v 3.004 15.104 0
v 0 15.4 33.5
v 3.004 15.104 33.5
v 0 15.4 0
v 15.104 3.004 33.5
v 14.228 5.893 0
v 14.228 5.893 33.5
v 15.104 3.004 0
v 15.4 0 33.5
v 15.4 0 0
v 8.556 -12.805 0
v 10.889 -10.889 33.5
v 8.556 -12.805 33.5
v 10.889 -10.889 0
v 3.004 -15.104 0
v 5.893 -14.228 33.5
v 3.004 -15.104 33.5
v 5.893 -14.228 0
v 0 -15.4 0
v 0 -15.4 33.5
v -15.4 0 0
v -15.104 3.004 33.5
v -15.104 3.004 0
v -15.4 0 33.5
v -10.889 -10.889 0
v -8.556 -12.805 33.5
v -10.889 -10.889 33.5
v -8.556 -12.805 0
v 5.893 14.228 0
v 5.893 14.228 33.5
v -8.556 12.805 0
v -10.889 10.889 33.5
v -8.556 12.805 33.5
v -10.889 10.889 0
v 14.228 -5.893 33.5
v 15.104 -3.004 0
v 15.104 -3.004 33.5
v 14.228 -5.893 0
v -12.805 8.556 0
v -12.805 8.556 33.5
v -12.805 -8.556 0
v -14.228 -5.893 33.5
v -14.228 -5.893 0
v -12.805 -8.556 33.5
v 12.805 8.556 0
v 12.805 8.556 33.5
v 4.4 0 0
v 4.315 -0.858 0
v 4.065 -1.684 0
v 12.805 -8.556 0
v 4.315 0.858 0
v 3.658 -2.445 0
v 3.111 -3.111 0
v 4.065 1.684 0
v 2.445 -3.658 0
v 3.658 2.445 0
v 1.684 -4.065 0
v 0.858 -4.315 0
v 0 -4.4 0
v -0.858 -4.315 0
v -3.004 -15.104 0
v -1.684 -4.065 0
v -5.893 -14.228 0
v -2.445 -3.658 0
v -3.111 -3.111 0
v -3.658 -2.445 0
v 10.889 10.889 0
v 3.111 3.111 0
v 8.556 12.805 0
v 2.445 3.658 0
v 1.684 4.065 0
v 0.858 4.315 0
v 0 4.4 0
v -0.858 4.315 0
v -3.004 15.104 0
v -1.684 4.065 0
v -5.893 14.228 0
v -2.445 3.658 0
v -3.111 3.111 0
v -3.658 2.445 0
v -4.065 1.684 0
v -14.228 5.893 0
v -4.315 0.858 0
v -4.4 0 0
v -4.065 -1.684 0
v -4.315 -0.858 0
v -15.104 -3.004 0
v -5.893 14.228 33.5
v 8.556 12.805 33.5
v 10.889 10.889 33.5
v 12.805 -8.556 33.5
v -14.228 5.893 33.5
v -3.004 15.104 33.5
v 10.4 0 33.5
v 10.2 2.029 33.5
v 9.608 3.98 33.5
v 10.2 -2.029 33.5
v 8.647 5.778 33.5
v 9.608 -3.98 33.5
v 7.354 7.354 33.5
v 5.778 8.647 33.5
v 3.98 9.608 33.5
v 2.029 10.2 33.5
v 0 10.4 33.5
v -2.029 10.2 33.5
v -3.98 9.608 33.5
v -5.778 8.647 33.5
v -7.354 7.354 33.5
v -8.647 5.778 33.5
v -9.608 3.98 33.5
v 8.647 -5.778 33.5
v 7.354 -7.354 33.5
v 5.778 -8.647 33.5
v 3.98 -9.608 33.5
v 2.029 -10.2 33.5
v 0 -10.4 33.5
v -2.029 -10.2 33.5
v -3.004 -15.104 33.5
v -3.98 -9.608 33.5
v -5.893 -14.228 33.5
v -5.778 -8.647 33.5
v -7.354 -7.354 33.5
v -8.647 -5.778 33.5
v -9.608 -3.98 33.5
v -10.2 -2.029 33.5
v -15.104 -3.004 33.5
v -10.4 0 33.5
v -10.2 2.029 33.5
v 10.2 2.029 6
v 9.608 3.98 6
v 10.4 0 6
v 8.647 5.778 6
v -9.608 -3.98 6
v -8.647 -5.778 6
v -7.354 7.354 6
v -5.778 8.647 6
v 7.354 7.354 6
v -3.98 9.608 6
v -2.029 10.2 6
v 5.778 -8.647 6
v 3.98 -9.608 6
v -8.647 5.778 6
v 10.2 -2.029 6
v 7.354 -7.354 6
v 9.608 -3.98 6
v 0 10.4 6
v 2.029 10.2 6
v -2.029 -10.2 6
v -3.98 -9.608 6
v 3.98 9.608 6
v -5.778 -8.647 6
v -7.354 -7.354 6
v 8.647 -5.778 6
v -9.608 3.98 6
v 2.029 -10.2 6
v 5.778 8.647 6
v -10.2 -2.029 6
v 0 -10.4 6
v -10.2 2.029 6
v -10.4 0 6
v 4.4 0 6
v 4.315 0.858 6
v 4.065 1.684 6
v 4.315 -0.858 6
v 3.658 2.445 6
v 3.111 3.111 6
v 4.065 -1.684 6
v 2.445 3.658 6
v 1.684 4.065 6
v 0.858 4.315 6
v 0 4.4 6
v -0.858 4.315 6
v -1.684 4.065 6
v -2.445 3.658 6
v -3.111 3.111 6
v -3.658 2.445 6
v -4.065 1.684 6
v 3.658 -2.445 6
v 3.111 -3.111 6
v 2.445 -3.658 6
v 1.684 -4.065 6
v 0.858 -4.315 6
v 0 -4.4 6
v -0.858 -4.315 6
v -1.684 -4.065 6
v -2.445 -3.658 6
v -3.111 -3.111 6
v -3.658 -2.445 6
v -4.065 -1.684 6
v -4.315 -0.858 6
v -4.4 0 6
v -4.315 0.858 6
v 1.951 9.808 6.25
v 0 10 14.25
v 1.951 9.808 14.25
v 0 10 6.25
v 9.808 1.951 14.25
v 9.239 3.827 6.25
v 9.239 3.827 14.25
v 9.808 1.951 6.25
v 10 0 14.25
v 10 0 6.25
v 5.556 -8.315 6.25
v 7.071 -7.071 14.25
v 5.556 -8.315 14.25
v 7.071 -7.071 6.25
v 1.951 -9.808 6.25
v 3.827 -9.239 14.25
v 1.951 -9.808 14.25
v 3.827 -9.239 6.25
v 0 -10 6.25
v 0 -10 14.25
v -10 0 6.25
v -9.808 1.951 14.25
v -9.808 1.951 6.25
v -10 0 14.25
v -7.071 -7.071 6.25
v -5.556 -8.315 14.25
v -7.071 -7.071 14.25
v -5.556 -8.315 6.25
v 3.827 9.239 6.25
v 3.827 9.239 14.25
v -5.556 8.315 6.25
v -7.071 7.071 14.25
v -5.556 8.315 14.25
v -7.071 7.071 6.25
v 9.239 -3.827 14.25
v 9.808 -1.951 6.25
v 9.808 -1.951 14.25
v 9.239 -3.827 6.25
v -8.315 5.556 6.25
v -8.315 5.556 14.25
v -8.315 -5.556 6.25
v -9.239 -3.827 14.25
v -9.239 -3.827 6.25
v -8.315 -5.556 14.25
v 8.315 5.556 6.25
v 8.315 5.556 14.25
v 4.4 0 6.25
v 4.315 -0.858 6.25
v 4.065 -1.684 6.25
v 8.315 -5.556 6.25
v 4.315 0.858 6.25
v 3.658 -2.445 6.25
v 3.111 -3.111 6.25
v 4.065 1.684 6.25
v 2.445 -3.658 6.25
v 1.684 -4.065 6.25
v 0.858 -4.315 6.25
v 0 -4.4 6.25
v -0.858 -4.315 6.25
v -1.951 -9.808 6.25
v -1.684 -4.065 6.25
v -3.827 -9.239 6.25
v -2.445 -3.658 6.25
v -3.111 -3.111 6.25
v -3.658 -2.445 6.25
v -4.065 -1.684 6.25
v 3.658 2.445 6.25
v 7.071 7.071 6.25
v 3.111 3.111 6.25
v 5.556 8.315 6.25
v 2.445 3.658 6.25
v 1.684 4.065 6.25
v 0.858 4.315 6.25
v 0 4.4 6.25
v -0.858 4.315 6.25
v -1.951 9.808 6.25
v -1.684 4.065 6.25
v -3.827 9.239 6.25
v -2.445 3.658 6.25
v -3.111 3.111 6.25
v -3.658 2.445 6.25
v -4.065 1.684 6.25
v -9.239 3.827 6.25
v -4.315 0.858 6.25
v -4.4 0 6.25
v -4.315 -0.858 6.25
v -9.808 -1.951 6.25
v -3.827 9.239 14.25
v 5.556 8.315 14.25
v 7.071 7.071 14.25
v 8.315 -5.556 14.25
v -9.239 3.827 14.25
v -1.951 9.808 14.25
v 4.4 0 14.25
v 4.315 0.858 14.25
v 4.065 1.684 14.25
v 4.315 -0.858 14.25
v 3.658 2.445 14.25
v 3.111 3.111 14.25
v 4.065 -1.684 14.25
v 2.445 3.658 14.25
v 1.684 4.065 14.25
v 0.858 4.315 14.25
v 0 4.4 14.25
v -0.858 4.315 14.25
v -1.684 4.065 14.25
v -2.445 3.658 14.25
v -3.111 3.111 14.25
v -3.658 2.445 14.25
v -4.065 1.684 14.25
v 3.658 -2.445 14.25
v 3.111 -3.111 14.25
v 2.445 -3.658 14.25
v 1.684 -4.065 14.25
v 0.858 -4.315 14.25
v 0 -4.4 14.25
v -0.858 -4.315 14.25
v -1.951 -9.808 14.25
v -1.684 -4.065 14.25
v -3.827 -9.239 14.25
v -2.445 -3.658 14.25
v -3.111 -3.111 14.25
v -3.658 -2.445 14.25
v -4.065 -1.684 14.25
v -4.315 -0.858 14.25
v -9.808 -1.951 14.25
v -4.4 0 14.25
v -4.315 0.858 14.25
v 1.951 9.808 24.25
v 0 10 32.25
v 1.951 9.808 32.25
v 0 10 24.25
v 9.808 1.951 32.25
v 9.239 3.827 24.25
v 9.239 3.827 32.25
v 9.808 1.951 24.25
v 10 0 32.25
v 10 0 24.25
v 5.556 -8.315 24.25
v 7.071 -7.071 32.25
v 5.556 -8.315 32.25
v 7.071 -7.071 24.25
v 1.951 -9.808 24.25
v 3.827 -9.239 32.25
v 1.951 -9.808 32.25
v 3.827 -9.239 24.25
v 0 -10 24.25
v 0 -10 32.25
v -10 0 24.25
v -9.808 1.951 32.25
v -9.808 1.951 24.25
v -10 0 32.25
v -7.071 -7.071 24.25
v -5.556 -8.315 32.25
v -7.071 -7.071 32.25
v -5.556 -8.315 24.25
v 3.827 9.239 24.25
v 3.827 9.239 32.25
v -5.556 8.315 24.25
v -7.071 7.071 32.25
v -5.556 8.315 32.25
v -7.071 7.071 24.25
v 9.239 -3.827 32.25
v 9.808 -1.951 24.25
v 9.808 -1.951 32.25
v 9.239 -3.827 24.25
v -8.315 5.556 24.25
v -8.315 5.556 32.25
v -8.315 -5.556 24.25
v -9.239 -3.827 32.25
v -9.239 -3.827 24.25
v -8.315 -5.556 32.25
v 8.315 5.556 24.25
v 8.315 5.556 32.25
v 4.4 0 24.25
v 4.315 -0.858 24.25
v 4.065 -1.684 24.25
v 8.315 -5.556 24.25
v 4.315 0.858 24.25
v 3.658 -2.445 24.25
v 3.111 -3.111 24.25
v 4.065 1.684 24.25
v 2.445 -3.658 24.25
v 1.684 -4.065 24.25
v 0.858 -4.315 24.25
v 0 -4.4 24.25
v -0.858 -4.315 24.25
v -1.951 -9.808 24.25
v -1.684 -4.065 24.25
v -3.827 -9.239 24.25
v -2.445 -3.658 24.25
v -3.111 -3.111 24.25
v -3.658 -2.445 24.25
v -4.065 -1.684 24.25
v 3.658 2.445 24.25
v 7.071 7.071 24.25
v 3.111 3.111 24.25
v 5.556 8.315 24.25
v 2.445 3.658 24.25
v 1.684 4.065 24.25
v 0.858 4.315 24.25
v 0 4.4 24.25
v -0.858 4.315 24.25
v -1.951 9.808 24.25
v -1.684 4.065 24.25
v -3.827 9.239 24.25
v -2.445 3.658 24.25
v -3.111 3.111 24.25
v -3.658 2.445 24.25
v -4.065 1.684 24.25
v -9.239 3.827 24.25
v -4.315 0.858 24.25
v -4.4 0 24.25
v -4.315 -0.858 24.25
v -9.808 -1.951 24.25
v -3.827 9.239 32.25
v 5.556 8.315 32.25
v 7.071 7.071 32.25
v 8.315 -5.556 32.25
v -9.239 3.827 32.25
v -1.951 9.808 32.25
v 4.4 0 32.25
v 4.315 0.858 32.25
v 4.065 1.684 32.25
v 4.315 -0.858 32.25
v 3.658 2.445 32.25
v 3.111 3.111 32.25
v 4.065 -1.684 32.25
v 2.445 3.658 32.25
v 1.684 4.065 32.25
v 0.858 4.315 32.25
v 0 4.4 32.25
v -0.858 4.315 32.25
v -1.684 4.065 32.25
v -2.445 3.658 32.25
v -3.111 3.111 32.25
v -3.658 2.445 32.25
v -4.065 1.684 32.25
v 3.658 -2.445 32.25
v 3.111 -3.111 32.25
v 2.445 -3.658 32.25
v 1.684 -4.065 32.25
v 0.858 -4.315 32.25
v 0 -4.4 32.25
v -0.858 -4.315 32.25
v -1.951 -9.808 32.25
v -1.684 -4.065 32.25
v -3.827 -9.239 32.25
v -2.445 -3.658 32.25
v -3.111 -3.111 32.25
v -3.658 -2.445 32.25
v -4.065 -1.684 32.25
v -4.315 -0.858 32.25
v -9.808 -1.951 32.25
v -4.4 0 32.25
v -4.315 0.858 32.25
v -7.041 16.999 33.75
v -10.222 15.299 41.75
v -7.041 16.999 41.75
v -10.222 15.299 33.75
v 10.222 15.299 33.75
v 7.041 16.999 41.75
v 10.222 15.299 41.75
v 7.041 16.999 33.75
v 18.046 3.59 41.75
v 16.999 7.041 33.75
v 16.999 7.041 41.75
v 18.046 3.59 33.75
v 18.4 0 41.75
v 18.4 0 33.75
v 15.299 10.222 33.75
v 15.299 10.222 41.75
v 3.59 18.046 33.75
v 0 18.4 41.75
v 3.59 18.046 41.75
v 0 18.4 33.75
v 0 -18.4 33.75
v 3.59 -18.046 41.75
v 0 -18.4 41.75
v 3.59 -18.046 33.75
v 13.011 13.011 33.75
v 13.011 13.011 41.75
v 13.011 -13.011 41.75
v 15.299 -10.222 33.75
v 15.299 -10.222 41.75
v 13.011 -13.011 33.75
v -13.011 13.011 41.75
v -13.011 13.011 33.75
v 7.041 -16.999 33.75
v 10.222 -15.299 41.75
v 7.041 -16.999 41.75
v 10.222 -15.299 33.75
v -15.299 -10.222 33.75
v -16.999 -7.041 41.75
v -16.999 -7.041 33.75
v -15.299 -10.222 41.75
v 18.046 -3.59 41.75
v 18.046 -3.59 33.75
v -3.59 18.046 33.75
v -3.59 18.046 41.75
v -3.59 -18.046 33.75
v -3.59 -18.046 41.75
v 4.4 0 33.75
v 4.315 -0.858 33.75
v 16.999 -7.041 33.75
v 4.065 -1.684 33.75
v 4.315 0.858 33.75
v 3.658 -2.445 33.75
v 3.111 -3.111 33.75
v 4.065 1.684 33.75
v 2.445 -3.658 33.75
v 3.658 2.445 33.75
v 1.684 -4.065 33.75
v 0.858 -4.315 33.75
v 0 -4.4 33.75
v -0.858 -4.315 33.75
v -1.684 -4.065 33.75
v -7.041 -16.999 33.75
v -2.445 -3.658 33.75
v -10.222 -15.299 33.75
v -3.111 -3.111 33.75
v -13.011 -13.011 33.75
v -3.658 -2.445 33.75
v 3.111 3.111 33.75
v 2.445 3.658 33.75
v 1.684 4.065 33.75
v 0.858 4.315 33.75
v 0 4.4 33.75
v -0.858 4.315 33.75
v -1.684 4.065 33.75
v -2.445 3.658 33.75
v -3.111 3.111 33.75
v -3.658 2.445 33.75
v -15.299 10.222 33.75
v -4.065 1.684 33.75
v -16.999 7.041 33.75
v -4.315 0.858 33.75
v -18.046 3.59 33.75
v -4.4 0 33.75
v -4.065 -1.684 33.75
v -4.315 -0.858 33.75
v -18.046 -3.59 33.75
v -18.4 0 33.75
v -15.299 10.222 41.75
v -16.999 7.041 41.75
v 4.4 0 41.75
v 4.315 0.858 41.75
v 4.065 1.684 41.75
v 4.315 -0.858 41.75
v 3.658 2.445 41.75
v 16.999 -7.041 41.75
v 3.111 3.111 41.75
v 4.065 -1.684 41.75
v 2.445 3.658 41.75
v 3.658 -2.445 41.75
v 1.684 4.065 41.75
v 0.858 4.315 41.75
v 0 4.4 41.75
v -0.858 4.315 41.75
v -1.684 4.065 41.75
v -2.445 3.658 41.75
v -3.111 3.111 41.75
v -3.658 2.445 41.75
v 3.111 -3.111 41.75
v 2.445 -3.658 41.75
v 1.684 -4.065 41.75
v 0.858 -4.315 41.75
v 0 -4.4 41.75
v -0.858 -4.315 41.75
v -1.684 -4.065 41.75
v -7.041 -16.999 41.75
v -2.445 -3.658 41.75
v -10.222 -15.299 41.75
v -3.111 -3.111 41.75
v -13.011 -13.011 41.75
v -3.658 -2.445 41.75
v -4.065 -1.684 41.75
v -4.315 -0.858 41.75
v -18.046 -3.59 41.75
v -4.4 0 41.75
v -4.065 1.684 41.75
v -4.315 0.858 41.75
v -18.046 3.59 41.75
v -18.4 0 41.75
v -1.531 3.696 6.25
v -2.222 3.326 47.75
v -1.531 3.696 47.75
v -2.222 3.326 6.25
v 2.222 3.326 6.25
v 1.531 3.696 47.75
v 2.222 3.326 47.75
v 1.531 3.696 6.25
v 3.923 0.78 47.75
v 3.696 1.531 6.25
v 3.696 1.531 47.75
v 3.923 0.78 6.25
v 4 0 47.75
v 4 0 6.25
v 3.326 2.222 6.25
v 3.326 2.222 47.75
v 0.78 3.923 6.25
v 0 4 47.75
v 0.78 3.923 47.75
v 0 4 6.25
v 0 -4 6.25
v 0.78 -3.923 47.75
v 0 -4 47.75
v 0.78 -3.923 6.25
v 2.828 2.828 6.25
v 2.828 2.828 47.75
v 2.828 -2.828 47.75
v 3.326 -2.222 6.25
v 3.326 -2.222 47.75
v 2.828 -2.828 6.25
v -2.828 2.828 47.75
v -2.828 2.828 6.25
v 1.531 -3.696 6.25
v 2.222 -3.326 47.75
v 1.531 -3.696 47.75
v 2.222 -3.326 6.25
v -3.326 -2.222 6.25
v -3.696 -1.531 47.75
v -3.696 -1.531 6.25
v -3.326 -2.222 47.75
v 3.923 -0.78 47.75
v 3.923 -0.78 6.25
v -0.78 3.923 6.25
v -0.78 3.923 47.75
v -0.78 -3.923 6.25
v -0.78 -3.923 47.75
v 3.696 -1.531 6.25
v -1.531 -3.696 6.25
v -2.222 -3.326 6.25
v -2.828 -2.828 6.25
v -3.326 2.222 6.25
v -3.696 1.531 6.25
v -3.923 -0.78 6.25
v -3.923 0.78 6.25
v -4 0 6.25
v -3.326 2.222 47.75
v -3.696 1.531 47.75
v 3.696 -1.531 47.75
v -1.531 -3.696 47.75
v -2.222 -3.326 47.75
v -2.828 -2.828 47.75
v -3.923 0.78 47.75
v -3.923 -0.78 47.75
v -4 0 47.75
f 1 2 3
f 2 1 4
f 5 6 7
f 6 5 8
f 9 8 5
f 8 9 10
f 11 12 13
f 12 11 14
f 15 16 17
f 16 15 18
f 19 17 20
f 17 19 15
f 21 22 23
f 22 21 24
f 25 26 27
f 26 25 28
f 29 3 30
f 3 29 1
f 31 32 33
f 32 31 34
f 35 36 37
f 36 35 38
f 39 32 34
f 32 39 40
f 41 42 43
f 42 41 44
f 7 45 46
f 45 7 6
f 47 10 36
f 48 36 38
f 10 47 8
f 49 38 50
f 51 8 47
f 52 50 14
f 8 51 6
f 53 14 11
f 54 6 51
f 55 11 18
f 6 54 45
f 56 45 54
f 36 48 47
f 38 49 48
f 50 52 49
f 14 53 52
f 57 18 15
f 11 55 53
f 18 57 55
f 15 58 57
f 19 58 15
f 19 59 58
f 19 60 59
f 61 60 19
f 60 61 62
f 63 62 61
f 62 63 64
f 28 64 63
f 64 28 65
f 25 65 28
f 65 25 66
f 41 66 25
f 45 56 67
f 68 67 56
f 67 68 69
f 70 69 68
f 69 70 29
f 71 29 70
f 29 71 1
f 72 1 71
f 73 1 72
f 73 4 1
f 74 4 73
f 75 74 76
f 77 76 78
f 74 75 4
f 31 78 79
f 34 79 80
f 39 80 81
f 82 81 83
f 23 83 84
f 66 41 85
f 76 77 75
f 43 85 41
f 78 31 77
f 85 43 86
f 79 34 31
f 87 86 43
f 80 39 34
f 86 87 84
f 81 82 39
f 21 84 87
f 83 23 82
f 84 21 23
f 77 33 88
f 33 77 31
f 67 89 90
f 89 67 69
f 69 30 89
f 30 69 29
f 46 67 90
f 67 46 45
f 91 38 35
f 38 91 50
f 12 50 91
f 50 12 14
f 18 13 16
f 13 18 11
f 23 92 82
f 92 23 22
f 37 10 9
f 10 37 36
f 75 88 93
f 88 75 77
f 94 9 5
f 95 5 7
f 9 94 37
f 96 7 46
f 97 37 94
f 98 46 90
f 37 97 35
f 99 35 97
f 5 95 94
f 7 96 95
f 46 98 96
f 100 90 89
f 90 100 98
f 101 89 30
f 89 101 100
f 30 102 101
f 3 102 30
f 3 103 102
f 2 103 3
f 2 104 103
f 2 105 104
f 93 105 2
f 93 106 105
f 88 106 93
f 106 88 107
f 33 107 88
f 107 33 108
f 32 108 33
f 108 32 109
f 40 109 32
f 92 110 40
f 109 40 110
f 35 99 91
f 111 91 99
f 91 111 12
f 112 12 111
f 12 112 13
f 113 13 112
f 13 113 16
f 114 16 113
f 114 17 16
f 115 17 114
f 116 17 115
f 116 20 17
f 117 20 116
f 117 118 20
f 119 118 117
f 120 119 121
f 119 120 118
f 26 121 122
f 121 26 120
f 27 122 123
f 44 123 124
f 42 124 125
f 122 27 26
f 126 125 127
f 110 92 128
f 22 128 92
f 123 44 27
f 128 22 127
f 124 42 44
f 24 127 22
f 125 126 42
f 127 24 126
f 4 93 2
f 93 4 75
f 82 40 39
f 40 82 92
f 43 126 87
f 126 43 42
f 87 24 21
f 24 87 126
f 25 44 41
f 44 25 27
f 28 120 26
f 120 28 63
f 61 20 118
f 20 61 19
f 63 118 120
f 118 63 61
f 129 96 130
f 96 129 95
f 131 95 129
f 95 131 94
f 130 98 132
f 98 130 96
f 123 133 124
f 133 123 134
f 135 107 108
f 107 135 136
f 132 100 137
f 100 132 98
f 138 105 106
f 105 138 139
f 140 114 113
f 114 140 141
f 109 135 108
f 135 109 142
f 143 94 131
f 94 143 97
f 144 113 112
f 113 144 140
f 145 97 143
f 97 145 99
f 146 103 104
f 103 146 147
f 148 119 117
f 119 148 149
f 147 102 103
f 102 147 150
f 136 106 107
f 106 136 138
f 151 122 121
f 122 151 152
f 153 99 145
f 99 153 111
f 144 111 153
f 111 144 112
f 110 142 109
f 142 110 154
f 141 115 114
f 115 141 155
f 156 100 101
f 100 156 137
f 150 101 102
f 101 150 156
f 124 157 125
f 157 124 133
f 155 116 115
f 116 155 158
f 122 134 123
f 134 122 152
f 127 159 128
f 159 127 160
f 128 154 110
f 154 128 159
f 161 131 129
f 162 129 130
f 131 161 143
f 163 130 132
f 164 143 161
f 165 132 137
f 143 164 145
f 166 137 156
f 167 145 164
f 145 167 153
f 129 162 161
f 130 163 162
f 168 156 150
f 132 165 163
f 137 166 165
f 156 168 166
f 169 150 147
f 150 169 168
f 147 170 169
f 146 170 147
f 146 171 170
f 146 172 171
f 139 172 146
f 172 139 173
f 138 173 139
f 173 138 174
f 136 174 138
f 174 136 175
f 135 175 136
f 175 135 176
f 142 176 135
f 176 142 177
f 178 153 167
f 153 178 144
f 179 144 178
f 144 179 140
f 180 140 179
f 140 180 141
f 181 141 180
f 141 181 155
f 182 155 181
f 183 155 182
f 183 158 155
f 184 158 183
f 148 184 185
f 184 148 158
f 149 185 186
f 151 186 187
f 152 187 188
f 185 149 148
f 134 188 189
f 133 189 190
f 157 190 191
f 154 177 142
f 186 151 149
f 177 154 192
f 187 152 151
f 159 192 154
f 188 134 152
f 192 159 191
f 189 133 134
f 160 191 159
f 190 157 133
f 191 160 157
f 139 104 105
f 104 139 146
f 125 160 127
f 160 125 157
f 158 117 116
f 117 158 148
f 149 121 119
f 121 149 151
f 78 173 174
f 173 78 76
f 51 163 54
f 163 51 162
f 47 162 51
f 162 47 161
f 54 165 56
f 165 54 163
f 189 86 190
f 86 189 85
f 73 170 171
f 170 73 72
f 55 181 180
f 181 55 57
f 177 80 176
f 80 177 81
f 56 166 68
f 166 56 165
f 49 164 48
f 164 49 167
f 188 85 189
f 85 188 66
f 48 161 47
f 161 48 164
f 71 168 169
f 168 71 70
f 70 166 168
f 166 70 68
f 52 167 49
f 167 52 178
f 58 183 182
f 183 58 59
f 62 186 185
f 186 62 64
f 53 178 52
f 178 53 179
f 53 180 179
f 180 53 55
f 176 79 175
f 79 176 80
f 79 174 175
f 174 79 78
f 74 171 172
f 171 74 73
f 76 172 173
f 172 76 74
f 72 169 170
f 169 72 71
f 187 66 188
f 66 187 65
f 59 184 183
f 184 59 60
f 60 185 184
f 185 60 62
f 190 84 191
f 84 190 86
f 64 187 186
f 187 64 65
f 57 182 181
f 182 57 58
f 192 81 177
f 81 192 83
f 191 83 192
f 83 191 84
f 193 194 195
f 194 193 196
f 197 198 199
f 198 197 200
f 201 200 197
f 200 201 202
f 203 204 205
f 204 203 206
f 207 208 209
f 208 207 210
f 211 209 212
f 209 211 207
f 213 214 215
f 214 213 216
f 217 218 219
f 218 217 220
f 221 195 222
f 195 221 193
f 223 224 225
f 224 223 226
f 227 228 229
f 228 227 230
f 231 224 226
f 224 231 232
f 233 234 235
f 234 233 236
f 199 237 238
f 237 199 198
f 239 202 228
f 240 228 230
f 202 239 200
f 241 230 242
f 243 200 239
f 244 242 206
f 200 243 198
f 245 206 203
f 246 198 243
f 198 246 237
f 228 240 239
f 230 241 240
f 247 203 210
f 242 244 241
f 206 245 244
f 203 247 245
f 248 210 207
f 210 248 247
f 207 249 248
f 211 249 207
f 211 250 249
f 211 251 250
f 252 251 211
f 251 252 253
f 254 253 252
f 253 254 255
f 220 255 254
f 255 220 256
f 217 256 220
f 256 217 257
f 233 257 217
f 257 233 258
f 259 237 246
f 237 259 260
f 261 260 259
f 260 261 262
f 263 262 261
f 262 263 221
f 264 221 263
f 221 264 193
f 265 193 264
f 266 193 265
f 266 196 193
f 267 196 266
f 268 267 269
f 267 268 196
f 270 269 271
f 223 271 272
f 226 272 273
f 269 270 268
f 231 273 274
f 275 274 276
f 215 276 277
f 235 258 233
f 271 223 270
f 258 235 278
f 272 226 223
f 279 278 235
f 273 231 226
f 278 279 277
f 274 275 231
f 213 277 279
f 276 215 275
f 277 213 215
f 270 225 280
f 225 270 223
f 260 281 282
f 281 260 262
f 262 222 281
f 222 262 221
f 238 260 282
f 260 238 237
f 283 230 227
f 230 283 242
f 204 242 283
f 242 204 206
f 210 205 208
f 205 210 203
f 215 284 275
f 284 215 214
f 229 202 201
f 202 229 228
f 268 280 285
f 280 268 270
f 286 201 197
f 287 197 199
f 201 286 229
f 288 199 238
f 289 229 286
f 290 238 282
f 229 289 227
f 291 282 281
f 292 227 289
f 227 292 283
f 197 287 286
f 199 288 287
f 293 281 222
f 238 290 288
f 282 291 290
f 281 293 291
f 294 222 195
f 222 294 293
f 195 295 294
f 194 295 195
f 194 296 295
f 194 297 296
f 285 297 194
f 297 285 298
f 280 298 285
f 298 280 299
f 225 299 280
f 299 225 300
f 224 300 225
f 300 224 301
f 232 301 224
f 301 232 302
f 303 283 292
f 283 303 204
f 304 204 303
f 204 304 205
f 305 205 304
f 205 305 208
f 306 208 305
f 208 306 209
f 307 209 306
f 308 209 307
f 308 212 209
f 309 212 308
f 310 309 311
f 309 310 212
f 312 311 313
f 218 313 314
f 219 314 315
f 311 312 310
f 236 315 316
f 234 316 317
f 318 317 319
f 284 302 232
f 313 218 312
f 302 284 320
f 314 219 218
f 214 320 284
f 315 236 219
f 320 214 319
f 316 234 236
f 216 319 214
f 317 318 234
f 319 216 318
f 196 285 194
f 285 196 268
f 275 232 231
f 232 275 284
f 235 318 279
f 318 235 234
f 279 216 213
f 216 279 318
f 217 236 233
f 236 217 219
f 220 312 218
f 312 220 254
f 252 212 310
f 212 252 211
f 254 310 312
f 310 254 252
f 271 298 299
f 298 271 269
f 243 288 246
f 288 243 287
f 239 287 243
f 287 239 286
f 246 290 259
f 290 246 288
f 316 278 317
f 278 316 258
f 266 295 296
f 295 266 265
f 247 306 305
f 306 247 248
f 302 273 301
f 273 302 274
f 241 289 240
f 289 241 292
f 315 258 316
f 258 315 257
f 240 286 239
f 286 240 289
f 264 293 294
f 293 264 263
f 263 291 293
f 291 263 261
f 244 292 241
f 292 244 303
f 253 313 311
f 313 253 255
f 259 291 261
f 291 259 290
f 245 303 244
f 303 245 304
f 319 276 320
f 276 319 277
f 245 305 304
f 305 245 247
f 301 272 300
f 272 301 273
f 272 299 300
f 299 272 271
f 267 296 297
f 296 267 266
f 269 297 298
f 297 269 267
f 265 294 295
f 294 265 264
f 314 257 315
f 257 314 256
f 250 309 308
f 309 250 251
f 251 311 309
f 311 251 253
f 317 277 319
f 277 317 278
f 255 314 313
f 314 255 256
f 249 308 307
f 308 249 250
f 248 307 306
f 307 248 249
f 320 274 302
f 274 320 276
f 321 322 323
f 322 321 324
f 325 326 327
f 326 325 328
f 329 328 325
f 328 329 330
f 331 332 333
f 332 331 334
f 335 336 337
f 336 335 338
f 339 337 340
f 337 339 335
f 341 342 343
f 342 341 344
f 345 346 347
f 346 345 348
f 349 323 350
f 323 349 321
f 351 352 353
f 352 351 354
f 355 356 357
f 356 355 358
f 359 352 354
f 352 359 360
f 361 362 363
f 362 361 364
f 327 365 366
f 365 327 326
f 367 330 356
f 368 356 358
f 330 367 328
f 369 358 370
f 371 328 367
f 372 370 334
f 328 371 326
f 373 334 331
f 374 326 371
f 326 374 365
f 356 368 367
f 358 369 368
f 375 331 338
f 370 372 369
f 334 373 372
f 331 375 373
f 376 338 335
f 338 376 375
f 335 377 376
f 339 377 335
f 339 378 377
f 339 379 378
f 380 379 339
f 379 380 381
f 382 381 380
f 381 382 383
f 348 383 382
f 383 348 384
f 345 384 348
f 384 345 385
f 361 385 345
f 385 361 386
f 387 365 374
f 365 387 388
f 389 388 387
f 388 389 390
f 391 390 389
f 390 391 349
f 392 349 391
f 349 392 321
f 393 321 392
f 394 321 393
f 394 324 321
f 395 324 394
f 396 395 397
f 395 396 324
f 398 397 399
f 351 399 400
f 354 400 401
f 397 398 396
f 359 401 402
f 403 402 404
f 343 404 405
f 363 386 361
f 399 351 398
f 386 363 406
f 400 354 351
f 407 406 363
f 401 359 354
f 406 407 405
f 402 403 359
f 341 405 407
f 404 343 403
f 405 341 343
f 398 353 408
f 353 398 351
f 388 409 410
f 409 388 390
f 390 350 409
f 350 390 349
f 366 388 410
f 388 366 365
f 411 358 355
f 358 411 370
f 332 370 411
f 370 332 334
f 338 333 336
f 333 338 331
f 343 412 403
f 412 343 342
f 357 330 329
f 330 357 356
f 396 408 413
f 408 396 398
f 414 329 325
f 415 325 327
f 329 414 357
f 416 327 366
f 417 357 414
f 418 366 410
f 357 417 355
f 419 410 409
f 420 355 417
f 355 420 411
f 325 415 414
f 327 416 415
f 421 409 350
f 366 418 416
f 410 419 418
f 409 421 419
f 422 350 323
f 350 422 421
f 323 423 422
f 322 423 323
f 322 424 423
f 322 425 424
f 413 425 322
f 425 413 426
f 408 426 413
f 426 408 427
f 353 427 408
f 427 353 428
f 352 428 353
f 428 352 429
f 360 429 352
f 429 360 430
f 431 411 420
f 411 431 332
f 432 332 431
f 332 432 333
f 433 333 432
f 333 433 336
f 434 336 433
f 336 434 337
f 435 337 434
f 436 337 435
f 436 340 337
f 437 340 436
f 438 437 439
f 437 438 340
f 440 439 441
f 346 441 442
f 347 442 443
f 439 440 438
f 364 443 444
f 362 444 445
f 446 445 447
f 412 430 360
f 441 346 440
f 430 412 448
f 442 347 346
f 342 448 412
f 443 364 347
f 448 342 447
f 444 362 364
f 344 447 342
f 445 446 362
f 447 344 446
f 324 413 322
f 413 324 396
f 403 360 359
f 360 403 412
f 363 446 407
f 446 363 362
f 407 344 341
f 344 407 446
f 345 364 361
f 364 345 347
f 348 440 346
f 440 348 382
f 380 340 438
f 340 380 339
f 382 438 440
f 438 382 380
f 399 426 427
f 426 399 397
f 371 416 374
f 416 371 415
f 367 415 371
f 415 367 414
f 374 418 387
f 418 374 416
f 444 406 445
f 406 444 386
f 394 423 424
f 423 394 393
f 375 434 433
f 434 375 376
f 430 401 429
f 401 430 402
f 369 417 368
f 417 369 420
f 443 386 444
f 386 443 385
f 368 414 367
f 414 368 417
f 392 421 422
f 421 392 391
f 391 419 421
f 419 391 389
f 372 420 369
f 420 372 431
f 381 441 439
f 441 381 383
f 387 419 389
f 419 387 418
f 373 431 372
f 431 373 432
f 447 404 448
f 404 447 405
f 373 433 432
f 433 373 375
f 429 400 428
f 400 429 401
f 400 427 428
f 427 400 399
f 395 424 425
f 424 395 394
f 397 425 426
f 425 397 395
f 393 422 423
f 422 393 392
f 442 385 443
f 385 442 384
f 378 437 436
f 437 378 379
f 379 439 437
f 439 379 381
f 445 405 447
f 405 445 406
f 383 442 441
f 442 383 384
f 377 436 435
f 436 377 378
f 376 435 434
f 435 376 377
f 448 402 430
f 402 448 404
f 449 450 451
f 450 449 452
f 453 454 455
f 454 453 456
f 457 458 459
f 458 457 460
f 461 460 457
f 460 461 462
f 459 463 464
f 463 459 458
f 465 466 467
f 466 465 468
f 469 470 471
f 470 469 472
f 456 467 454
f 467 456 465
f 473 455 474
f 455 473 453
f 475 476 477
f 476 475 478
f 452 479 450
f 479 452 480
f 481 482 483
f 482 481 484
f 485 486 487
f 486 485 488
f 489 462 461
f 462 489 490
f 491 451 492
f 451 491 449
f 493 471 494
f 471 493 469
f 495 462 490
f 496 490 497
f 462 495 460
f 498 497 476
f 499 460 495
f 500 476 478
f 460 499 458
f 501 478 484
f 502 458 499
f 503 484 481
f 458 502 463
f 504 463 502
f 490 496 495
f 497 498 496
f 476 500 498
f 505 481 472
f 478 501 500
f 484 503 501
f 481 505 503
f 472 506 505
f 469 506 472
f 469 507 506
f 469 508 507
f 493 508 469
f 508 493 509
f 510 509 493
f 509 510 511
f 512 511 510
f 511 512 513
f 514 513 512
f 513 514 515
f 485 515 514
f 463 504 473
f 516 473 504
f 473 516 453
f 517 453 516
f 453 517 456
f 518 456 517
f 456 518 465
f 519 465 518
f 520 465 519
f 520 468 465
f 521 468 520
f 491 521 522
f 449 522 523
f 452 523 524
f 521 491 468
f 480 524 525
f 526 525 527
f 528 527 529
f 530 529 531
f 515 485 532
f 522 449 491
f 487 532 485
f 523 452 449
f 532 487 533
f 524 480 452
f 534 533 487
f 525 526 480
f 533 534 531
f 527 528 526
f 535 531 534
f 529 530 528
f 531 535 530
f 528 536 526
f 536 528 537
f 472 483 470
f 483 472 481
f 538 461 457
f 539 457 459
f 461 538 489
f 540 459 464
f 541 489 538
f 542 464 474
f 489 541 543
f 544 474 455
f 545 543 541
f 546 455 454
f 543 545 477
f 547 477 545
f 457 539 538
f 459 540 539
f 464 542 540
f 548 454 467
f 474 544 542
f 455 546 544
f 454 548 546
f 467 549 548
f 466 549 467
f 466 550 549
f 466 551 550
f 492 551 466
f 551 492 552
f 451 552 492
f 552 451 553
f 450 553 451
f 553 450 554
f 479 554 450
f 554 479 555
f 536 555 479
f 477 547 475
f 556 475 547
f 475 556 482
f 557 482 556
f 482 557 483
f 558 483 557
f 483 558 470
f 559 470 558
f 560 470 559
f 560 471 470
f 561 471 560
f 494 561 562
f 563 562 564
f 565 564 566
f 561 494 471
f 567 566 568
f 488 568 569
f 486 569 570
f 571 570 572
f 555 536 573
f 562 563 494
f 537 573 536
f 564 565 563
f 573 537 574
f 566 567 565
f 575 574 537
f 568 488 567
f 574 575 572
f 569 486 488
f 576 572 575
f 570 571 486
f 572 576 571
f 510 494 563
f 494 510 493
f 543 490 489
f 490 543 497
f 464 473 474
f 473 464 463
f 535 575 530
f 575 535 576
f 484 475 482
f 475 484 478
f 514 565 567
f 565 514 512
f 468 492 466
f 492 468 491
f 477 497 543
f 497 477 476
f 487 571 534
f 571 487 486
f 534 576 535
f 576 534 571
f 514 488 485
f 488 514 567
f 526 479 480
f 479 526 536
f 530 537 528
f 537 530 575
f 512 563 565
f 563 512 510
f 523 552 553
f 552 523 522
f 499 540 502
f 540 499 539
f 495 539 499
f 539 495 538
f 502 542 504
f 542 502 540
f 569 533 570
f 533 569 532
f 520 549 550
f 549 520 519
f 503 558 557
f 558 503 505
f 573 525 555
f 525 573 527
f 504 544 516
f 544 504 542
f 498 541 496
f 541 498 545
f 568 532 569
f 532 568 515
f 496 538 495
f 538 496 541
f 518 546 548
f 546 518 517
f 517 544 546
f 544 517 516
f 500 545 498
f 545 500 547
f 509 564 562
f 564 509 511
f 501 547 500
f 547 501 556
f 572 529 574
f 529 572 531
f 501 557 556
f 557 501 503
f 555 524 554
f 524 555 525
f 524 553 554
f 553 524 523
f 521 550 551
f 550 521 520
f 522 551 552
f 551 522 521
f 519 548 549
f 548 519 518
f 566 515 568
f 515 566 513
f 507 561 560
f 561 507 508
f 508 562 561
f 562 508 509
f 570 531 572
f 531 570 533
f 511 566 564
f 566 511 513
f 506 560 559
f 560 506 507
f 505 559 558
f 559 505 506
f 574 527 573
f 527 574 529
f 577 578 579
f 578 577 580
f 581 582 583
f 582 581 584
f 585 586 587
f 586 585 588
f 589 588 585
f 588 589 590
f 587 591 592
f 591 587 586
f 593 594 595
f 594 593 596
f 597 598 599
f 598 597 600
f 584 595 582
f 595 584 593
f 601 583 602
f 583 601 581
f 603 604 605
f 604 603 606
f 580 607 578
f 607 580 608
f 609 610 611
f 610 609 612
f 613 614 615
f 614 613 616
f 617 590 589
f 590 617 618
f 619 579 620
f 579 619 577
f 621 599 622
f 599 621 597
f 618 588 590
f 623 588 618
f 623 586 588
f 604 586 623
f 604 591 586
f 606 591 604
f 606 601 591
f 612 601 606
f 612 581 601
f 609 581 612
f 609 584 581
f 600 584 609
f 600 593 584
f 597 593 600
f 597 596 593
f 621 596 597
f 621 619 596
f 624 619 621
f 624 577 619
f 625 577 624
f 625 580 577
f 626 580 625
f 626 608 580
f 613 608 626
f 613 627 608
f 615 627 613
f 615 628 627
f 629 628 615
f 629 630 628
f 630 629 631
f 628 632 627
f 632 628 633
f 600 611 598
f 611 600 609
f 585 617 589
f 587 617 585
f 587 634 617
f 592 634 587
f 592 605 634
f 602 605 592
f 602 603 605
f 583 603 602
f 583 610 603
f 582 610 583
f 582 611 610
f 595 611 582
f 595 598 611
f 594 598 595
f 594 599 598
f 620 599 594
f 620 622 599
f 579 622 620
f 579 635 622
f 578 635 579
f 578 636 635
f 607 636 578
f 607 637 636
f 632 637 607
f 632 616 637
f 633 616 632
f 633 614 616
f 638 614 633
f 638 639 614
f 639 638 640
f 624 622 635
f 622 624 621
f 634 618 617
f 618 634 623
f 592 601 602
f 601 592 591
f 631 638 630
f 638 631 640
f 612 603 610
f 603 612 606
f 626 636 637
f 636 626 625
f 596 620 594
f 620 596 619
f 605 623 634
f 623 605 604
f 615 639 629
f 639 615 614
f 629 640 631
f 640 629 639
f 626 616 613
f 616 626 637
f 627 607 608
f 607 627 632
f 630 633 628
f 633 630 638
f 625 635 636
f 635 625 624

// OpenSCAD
$fn = 32;

// ------------------------------------------------------------------------
// Shaft station: cup d30.8 x 33.5 mm, shaft d8
// Every part is its own module, assembly() places every instance.
// ------------------------------------------------------------------------

// --- part 1 ---
module housing_cup() {
  difference() {
    cylinder(h = 33.5, d = 30.8);
    translate([0, 0, 6]) cylinder(h = 28.5, d = 20.8);
    translate([0, 0, -1]) cylinder(h = 8, d = 8.8);
  }
}

// --- part 2 ---
module bearing_lower() {
  difference() {
      translate([0, 0, 0]) cylinder(h = 8, d = 20);
      translate([0, 0, -1]) cylinder(h = 10, d = 8.8);
    }
}

// --- part 3 ---
module bearing_upper() {
  difference() {
      translate([0, 0, 0]) cylinder(h = 8, d = 20);
      translate([0, 0, -1]) cylinder(h = 10, d = 8.8);
    }
}

// --- part 4 ---
module station_shaft() {
  translate([0, 0, -20.75]) cylinder(h = 41.5, d = 8);
}

// --- part 5 ---
module station_cover() {
  difference() {
    cylinder(h = 8, d = 36.8);
    translate([0, 0, -1]) cylinder(h = 10, d = 8.8);
  }
}

// --- assembly ---
module assembly() {
  color([0.80, 0.24, 0.20]) translate([0, 0, 0]) rotate([0, 0, 0]) housing_cup();
  color([0.20, 0.45, 0.75]) translate([0, 0, 6.25]) rotate([0, 0, 0]) bearing_lower();
  color([0.25, 0.62, 0.32]) translate([0, 0, 24.25]) rotate([0, 0, 0]) bearing_upper();
  color([0.92, 0.70, 0.18]) translate([0, 0, 27]) rotate([0, 0, 0]) station_shaft();
  color([0.58, 0.35, 0.70]) translate([0, 0, 33.75]) rotate([0, 0, 0]) station_cover();
}

assembly();
